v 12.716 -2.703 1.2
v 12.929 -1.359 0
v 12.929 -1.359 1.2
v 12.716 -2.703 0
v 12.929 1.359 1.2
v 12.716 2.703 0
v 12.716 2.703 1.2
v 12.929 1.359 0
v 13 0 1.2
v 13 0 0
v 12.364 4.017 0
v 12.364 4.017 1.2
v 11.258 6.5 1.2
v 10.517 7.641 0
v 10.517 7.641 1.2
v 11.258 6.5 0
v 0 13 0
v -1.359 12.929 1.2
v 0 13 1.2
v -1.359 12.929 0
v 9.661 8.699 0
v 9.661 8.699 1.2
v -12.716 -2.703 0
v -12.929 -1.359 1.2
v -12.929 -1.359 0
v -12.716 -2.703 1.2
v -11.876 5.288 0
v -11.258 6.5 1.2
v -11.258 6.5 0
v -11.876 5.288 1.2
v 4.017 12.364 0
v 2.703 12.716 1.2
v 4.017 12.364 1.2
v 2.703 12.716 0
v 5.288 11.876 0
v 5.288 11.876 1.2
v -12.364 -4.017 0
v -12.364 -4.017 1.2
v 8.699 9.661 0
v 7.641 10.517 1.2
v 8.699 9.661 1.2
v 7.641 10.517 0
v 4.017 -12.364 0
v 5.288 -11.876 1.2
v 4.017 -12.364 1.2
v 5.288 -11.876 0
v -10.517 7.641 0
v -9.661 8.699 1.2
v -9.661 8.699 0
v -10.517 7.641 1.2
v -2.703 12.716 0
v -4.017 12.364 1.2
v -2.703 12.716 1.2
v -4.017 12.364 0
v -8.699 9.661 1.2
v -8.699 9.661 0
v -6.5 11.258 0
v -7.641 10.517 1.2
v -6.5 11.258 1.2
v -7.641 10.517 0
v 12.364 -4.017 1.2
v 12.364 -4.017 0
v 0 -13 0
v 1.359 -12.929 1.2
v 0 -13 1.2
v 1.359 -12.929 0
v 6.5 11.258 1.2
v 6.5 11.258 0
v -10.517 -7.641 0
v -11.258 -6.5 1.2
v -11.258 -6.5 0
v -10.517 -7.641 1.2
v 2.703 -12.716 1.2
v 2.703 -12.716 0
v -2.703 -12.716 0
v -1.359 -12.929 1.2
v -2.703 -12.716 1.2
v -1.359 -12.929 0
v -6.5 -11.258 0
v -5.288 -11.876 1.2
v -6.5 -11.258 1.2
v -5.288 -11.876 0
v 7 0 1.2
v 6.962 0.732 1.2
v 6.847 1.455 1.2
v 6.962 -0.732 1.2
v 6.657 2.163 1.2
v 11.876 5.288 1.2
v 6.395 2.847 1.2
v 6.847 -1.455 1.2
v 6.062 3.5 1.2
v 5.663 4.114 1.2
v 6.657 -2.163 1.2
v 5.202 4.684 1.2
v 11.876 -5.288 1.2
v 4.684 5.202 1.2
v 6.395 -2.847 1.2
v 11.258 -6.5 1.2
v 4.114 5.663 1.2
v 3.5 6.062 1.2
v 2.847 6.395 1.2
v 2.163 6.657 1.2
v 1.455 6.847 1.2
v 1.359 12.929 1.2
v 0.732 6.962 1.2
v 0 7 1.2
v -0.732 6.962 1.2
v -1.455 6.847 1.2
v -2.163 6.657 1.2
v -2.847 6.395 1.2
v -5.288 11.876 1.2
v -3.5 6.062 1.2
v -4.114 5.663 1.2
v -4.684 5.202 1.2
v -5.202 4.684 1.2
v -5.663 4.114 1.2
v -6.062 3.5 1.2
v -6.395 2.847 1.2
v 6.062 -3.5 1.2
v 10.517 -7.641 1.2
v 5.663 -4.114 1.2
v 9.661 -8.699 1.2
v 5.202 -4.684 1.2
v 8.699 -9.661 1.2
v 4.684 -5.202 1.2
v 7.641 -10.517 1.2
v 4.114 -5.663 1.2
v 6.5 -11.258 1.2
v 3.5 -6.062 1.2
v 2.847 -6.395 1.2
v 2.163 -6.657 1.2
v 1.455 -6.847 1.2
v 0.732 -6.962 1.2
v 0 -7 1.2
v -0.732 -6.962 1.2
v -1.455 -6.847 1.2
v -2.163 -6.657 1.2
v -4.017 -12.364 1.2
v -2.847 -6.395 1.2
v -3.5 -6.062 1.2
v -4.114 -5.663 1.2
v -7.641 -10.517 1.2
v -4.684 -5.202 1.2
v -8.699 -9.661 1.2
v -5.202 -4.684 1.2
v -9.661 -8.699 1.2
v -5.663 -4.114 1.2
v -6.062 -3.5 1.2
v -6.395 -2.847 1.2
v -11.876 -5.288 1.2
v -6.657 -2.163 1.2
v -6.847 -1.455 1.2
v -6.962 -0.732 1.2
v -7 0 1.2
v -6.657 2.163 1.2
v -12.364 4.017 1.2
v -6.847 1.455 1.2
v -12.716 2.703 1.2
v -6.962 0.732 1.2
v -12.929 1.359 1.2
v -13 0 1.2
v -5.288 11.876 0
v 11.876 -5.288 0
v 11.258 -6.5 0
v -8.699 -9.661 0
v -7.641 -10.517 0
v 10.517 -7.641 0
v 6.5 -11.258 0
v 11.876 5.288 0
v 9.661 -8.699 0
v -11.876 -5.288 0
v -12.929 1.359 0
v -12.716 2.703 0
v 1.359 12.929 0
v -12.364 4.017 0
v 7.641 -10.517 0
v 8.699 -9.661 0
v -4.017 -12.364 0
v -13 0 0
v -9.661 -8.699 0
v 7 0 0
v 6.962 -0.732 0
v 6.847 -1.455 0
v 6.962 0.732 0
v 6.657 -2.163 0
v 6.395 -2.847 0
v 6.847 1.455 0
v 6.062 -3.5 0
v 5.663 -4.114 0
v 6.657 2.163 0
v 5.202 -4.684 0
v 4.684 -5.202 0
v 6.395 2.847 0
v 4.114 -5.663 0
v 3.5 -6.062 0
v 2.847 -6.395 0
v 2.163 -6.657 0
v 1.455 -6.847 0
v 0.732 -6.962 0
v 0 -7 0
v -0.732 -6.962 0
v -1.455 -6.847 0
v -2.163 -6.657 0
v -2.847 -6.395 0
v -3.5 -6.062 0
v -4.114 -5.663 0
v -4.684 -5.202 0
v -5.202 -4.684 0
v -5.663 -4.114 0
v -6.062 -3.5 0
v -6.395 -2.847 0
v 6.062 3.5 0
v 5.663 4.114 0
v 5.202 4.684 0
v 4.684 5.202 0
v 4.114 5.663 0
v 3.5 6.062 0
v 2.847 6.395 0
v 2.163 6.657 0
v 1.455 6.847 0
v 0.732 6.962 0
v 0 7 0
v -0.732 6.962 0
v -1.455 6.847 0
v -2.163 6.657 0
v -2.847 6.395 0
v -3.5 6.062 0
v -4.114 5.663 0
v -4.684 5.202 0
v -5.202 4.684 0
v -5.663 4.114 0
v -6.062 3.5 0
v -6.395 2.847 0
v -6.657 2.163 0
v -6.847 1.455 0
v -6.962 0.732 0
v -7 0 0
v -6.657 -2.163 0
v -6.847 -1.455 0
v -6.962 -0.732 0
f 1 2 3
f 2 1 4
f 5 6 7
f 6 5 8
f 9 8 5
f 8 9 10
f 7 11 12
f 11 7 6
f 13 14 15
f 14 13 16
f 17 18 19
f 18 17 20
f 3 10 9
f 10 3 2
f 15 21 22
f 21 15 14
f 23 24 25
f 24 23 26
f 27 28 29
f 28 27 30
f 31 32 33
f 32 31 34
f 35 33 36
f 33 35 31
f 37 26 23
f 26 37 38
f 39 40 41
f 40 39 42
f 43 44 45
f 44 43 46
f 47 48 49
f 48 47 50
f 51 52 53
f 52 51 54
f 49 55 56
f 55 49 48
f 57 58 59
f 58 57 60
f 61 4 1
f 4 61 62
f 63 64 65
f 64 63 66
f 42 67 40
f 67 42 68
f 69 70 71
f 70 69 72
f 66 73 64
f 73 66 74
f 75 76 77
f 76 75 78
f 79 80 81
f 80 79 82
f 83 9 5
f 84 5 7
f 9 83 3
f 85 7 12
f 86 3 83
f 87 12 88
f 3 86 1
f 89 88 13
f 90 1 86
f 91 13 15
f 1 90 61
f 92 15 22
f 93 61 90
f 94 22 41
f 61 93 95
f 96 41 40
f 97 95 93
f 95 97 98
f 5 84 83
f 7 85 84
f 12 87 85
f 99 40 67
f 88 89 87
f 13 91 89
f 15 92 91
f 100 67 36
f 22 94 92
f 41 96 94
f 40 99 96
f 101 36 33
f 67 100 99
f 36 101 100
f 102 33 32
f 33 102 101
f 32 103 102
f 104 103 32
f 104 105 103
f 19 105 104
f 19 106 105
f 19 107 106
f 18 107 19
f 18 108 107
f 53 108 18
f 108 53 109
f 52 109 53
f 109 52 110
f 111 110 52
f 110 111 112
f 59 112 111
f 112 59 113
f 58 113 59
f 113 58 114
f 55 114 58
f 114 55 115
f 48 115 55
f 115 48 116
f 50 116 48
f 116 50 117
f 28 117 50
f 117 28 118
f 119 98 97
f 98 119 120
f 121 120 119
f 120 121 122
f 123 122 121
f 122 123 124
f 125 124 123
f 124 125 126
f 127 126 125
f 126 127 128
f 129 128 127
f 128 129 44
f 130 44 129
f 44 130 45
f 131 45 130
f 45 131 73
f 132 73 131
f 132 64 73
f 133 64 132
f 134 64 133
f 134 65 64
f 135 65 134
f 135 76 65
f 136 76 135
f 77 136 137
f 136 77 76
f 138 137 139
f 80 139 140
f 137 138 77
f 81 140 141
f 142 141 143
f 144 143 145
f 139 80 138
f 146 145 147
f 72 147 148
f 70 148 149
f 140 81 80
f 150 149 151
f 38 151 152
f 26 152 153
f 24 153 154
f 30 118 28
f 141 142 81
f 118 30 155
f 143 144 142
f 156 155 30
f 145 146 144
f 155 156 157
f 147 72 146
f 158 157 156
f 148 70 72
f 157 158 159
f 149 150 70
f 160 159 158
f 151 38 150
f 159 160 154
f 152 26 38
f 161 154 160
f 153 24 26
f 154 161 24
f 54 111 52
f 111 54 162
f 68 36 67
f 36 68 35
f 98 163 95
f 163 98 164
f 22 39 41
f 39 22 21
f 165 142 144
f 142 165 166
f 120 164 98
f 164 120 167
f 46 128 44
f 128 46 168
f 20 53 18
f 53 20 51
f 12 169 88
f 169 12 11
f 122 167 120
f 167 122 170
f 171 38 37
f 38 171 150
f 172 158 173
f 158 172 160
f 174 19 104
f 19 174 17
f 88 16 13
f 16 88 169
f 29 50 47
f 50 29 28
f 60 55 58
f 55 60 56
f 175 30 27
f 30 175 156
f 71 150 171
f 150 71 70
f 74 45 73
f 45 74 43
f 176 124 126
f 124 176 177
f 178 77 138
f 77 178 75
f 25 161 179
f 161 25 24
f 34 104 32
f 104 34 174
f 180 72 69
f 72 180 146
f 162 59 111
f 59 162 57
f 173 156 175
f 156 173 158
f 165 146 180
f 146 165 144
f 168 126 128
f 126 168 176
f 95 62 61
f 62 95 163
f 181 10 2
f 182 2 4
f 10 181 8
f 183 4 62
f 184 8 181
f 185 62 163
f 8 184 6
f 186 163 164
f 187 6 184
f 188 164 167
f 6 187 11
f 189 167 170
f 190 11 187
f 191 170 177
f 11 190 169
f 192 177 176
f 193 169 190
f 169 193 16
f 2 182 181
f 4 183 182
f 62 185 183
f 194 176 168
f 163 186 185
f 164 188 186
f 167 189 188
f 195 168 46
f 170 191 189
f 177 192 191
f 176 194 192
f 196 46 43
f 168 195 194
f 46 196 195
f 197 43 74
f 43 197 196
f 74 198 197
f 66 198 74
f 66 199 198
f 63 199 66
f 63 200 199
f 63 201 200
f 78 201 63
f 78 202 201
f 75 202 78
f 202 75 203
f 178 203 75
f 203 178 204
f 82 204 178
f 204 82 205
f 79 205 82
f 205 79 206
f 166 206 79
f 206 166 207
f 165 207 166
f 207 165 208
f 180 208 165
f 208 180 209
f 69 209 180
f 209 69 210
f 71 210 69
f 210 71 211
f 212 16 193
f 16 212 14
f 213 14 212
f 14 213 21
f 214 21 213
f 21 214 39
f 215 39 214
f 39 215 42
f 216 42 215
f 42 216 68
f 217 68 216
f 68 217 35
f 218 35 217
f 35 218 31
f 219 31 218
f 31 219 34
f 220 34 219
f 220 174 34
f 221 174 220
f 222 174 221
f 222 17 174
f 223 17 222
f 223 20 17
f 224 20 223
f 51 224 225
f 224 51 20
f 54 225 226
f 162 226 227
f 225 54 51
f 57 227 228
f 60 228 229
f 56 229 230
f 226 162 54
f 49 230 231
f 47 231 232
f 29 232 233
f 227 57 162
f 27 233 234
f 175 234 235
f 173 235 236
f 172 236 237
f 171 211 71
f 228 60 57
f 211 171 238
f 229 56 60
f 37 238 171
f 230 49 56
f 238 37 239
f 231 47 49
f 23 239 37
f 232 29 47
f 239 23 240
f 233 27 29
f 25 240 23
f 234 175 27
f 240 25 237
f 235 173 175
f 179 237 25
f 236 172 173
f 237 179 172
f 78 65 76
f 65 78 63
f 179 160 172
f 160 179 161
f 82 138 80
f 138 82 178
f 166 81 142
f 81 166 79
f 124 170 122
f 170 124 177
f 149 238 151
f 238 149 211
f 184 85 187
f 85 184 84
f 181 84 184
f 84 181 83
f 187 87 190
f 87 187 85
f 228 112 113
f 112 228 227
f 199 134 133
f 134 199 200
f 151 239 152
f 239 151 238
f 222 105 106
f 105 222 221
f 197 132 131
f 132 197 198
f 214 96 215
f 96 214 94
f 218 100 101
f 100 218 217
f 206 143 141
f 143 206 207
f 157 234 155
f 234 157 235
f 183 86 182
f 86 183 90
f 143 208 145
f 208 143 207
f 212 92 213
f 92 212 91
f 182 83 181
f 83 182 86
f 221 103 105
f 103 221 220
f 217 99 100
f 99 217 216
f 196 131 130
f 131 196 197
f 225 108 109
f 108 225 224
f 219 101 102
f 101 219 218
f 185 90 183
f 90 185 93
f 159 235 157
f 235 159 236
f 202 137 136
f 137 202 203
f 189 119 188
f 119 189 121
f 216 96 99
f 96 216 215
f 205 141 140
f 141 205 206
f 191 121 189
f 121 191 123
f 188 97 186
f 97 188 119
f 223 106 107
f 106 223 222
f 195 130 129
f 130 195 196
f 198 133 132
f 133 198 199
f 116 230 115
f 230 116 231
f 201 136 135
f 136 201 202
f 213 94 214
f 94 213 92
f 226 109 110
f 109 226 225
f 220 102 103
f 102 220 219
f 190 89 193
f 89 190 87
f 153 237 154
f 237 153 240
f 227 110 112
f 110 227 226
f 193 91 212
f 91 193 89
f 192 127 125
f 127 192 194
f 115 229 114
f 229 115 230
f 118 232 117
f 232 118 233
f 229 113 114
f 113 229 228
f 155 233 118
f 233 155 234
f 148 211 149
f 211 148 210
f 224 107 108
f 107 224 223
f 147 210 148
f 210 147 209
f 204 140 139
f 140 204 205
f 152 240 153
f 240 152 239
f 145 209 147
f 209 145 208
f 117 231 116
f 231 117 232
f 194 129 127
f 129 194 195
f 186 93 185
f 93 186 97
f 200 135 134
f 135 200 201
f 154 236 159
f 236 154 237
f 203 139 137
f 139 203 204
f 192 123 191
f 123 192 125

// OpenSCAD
// Precision shim ring.
$fn = 60;
eps = 0.02;
inner_d = 14;
outer_d = 26;
thickness = 1.2;
difference() {
    cylinder(d = outer_d, h = thickness);
    translate([0, 0, -eps]) cylinder(d = inner_d, h = thickness + 2 * eps);
}
